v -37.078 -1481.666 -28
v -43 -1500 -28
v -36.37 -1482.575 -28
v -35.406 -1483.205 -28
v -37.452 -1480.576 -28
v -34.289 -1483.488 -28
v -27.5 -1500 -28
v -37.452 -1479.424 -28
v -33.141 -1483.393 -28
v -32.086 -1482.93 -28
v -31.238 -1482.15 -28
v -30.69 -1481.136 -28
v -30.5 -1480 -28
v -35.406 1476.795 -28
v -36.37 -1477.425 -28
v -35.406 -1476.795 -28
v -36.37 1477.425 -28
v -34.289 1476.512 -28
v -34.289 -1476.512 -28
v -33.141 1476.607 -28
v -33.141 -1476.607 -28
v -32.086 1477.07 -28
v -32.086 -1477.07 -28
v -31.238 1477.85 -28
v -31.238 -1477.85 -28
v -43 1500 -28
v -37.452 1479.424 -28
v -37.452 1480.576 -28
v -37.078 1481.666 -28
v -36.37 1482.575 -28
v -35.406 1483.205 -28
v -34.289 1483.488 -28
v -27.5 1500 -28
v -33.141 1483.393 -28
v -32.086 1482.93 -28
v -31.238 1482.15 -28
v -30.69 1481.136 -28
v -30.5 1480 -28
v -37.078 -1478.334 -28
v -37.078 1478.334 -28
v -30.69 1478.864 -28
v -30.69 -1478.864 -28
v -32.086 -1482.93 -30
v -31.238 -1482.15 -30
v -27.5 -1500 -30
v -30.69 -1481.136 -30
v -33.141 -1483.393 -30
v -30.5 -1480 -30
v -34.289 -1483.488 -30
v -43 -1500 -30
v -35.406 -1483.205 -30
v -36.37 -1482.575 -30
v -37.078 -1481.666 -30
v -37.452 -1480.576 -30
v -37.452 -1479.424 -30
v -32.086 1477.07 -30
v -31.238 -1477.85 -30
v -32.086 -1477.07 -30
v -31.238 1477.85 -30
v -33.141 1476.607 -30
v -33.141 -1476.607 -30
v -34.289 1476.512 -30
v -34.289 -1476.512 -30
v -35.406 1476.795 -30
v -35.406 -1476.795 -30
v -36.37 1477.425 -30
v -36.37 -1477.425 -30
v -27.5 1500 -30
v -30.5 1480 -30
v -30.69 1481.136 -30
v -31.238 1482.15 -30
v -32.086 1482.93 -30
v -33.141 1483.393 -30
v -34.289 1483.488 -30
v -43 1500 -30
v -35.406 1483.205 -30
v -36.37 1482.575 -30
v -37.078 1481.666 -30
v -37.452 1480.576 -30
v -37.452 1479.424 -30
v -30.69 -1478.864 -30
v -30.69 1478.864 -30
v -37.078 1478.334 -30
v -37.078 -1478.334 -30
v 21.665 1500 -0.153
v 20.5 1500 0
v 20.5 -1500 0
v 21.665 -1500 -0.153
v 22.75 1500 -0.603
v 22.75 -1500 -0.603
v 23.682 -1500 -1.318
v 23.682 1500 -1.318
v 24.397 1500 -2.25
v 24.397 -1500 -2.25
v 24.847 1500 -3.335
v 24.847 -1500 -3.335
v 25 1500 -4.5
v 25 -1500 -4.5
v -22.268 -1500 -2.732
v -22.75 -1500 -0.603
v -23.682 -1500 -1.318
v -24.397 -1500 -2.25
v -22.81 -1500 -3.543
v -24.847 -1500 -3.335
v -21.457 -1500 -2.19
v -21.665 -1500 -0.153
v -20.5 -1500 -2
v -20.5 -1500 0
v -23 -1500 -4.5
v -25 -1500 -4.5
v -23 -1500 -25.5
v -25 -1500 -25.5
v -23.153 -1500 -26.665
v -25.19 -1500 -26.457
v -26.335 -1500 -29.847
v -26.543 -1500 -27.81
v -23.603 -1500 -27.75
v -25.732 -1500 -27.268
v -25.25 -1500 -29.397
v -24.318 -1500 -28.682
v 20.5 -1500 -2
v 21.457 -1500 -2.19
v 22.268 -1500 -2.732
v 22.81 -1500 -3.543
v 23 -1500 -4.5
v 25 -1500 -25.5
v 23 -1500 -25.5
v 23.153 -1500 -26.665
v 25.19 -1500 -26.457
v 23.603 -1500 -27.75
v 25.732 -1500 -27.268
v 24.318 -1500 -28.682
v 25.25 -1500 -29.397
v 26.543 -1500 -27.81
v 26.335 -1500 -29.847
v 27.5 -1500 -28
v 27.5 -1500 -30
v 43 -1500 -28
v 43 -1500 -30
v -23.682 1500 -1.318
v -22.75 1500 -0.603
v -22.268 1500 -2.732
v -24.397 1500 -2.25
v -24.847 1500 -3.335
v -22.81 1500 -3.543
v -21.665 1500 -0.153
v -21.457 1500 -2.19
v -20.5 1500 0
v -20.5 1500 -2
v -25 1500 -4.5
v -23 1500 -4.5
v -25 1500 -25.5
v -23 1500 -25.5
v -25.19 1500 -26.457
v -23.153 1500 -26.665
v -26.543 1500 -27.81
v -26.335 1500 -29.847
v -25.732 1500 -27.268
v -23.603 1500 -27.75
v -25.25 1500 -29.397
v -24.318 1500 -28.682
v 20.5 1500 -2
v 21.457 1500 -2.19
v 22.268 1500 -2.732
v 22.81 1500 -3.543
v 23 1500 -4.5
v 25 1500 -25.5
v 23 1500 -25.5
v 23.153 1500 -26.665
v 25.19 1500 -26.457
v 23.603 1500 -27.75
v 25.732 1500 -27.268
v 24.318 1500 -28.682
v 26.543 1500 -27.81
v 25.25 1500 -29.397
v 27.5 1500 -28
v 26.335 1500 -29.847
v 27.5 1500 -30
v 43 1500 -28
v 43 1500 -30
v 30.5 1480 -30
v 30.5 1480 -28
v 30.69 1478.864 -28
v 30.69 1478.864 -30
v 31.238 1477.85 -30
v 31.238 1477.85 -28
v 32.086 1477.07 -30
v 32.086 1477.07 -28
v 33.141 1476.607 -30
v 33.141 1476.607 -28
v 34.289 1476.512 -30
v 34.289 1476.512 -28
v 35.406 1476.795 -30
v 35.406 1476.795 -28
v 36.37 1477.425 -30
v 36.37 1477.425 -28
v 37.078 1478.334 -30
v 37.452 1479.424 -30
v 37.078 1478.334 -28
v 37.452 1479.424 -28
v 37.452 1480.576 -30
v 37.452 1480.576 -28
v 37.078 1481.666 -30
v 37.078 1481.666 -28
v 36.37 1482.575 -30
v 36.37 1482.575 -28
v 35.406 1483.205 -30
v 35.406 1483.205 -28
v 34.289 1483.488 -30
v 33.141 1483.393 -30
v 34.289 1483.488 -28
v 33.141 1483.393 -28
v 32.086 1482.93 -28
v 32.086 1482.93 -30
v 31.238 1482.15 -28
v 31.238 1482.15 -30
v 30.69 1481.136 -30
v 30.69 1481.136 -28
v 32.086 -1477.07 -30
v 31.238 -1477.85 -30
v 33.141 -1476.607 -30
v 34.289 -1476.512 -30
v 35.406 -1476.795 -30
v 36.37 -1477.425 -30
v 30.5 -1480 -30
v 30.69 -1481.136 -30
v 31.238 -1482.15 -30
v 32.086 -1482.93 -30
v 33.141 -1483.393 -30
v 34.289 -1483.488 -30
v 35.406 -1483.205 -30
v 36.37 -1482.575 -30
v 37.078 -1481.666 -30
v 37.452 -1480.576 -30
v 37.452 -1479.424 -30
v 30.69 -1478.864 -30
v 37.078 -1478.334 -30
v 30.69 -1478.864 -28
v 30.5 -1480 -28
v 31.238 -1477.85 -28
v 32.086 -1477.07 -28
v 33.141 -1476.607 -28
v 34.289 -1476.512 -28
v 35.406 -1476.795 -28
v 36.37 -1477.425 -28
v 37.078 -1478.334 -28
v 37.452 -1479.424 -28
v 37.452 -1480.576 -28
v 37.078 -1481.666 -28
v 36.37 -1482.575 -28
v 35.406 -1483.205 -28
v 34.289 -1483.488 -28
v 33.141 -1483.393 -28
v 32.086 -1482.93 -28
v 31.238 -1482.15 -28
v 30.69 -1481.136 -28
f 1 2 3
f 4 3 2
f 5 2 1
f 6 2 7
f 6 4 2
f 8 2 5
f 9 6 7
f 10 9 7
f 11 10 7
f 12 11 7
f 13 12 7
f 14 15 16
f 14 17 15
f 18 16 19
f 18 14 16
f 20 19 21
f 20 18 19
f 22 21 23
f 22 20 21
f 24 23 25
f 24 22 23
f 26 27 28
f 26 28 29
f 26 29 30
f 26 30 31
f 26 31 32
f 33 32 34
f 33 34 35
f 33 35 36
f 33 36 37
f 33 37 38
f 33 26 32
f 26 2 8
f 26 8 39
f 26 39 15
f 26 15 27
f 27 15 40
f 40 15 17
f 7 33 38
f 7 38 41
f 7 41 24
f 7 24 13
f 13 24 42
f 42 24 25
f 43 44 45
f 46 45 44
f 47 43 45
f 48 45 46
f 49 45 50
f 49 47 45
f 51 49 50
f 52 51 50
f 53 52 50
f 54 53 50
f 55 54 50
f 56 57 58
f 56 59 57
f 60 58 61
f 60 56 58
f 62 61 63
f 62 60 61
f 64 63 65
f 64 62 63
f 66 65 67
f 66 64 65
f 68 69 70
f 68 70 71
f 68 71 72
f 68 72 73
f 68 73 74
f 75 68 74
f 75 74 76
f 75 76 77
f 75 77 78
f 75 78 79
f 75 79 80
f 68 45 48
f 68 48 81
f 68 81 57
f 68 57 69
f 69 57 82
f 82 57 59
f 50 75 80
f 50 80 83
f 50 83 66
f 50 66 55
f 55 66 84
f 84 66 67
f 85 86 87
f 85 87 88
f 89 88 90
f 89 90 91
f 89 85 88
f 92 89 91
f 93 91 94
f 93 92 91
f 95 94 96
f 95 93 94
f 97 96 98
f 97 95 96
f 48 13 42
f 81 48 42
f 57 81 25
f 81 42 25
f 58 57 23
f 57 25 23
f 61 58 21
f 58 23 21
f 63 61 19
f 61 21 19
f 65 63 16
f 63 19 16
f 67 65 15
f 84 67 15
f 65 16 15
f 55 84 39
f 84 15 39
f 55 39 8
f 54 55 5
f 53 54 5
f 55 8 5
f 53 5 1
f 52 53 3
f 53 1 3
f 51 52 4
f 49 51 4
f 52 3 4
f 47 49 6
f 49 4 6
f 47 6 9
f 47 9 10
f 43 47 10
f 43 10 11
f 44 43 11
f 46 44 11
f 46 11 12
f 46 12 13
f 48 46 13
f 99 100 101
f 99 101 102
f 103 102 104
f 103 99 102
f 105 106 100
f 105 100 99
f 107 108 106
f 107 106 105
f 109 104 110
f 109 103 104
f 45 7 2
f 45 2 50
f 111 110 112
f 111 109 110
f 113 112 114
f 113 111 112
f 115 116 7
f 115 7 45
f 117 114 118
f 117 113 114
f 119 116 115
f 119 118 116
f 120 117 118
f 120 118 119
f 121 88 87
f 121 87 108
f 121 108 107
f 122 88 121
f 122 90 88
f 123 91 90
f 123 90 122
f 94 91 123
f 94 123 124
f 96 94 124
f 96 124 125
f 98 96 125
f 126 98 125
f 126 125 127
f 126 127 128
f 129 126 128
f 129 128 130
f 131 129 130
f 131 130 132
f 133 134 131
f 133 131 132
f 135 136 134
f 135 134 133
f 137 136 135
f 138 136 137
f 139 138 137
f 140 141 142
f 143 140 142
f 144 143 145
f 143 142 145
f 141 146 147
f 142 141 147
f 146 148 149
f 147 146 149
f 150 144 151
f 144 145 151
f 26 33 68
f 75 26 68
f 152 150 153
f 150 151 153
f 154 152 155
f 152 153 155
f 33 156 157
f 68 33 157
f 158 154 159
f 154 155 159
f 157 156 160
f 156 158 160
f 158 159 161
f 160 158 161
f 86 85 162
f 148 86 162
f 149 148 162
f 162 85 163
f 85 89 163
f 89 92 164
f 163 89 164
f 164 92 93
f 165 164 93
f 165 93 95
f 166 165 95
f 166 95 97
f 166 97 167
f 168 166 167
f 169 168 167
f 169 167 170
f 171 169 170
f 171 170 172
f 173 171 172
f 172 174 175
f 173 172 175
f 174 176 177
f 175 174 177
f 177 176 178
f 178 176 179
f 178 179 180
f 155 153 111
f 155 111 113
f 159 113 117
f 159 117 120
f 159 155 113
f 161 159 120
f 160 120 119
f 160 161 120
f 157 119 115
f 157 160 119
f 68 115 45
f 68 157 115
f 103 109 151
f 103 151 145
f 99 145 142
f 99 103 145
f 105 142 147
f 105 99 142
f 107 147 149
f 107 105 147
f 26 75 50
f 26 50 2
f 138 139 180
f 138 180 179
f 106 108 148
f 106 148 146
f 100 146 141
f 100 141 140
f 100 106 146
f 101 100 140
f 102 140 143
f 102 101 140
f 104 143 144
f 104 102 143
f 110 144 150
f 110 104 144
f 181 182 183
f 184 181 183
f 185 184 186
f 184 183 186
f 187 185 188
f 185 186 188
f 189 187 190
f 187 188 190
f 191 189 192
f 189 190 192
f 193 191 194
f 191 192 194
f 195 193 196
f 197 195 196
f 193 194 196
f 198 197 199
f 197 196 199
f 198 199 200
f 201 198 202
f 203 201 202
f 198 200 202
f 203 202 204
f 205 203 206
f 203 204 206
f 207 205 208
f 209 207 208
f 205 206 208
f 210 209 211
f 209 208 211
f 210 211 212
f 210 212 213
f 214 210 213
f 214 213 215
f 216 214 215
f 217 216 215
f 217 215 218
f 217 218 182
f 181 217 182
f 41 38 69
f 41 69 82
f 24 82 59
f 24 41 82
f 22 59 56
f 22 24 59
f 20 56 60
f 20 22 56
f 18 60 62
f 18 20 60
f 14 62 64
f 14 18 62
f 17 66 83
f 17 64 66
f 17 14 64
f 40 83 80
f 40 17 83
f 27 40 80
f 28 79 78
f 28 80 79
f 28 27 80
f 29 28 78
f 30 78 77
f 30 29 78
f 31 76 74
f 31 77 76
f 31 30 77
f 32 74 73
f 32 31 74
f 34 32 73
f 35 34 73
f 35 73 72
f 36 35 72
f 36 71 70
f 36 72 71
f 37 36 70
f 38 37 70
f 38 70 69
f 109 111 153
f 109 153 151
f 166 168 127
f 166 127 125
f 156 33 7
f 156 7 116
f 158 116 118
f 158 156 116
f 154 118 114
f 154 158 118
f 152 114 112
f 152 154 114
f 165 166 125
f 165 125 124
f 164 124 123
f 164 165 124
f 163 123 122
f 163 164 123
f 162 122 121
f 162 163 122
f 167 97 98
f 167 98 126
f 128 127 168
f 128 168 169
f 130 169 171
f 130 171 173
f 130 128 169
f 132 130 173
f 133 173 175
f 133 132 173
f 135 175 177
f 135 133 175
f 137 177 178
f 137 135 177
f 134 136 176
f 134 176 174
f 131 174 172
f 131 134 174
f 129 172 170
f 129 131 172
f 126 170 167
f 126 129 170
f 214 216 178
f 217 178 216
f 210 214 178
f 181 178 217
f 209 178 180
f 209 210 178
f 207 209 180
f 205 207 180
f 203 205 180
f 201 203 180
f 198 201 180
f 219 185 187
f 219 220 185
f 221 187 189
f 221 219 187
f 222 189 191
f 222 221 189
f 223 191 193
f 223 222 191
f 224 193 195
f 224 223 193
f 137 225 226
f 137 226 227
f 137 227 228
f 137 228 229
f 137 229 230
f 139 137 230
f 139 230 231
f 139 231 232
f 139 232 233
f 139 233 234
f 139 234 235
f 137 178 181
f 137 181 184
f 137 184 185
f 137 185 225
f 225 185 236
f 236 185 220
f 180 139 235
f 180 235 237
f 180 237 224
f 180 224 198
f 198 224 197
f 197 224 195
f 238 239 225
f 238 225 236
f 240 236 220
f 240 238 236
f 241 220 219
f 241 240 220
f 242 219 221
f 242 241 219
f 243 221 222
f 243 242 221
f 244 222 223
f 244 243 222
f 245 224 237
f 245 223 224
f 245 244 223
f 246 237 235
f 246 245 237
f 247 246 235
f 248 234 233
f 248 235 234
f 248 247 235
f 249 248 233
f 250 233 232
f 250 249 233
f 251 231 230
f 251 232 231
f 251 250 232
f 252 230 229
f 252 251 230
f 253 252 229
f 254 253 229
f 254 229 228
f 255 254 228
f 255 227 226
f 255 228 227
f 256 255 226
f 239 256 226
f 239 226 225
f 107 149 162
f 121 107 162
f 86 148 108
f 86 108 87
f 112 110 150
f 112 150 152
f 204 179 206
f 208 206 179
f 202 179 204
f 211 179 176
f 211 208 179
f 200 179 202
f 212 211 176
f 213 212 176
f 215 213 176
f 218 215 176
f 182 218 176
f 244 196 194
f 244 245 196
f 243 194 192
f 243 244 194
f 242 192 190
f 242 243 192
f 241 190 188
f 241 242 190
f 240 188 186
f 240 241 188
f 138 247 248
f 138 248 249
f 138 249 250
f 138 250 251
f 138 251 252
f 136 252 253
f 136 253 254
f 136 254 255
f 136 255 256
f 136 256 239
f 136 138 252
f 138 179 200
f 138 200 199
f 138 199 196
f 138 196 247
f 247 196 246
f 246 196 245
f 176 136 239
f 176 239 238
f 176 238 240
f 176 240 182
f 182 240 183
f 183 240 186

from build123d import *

# Parameters (mm, degrees)
SKETCH1_W                      = 50
SKETCH1_H                      = 3000
BASE_FLANGE1_DEPTH             = 2
EDGE_FLANGE1_STRIP_W           = 13
EDGE_FLANGE1_STRIP_H           = 2
EDGE_FLANGE1_STRIP_CUT_DEPTH   = 3000
EDGE_FLANGE1_STRIP_2_W         = 13
EDGE_FLANGE1_STRIP_2_H         = 2
EDGE_FLANGE1_STRIP_CUT_2_DEPTH = 3000
EDGE_FLANGE1_DEPTH             = 3000
EDGE_FLANGE1_BEND_DEPTH        = 3000
EDGE_FLANGE2_STRIP_W           = 13
EDGE_FLANGE2_STRIP_H           = 2
EDGE_FLANGE2_STRIP_CUT_DEPTH   = 3000
EDGE_FLANGE2_STRIP_2_W         = 13
EDGE_FLANGE2_STRIP_2_H         = 2
EDGE_FLANGE2_STRIP_CUT_2_DEPTH = 3000
EDGE_FLANGE2_DEPTH             = 3000
EDGE_FLANGE2_BEND_DEPTH        = 3000
SKETCH18_R                     = 3.5
CUT_EXTRUDE1_DEPTH             = 10
MIRROR2_COPY_1_SKETCH_R        = 3.5
MIRROR2_COPY_1_DEPTH           = 10


# Sheet-metal steps are written as plain solids
with BuildPart() as part:
    # Sketch1 → Base-Flange1 (new body)
    with BuildSketch(Plane.XY):
        Rectangle(SKETCH1_W, SKETCH1_H)
    extrude(amount=-BASE_FLANGE1_DEPTH)

    # Edge-Flange1 strip (across the edge) → Edge-Flange1 strip cut (cut)
    with BuildSketch(Plane(origin=(25, 1500, -2), x_dir=(-1, 0, 0), z_dir=(0, -1, 0))):
        with Locations((-2, -1)):
            Rectangle(EDGE_FLANGE1_STRIP_W, EDGE_FLANGE1_STRIP_H)
    extrude(amount=EDGE_FLANGE1_STRIP_CUT_DEPTH, mode=Mode.SUBTRACT)

    # Edge-Flange1 strip 2 (across the edge) → Edge-Flange1 strip cut 2 (cut)
    with BuildSketch(Plane(origin=(-25, -1500, -2), x_dir=(1, 0, 0), z_dir=(0, 1, 0))):
        with Locations((-2, -1)):
            Rectangle(EDGE_FLANGE1_STRIP_2_W, EDGE_FLANGE1_STRIP_2_H)
    extrude(amount=EDGE_FLANGE1_STRIP_CUT_2_DEPTH, mode=Mode.SUBTRACT)

    # Edge-Flange1 section (across the edge) → Edge-Flange1 (add)
    with BuildSketch(Plane(origin=(25, 1500, -2), x_dir=(-1, 0, 0), z_dir=(0, -1, 0))):
        with BuildLine():
            Line((0, 2.5), (0, 28))
            Line((0, 28), (2, 28))
            Line((2, 28), (2, 2.5))
            ThreePointArc((2, 2.5), (2.732233047, 0.732233047), (4.5, 0))
            Line((4.5, 0), (4.5, -2))
            ThreePointArc((4.5, -2), (1.318019485, -0.681980515), (0, 2.5))
        make_face()
    extrude(amount=EDGE_FLANGE1_DEPTH)

    # Edge-Flange1 section 2 (across the edge) → Edge-Flange1 bend (add)
    with BuildSketch(Plane(origin=(-25, -1500, -2), x_dir=(1, 0, 0), z_dir=(0, 1, 0))):
        with BuildLine():
            Line((0, 2.5), (0, 28))
            Line((0, 28), (2, 28))
            Line((2, 28), (2, 2.5))
            ThreePointArc((2, 2.5), (2.732233047, 0.732233047), (4.5, 0))
            Line((4.5, 0), (4.5, -2))
            ThreePointArc((4.5, -2), (1.318019485, -0.681980515), (0, 2.5))
        make_face()
    extrude(amount=EDGE_FLANGE1_BEND_DEPTH)

    # Edge-Flange2 strip (across the edge) → Edge-Flange2 strip cut (cut)
    with BuildSketch(Plane(origin=(-25, 1500, -30), x_dir=(0, 0, 1), z_dir=(0, -1, 0))):
        with Locations((-2, -1)):
            Rectangle(EDGE_FLANGE2_STRIP_W, EDGE_FLANGE2_STRIP_H)
    extrude(amount=EDGE_FLANGE2_STRIP_CUT_DEPTH, mode=Mode.SUBTRACT)

    # Edge-Flange2 strip 2 (across the edge) → Edge-Flange2 strip cut 2 (cut)
    with BuildSketch(Plane(origin=(25, -1500, -30), x_dir=(0, 0, 1), z_dir=(0, 1, 0))):
        with Locations((-2, -1)):
            Rectangle(EDGE_FLANGE2_STRIP_2_W, EDGE_FLANGE2_STRIP_2_H)
    extrude(amount=EDGE_FLANGE2_STRIP_CUT_2_DEPTH, mode=Mode.SUBTRACT)

    # Edge-Flange2 section (across the edge) → Edge-Flange2 (add)
    with BuildSketch(Plane(origin=(-25, 1500, -30), x_dir=(0, 0, 1), z_dir=(0, -1, 0))):
        with BuildLine():
            Line((0, 2.5), (0, 18))
            Line((0, 18), (2, 18))
            Line((2, 18), (2, 2.5))
            ThreePointArc((2, 2.5), (2.732233047, 0.732233047), (4.5, 0))
            Line((4.5, 0), (4.5, -2))
            ThreePointArc((4.5, -2), (1.318019485, -0.681980515), (0, 2.5))
        make_face()
    extrude(amount=EDGE_FLANGE2_DEPTH)

    # Edge-Flange2 section 2 (across the edge) → Edge-Flange2 bend (add)
    with BuildSketch(Plane(origin=(25, -1500, -30), x_dir=(0, 0, 1), z_dir=(0, 1, 0))):
        with BuildLine():
            Line((0, 2.5), (0, 18))
            Line((0, 18), (2, 18))
            Line((2, 18), (2, 2.5))
            ThreePointArc((2, 2.5), (2.732233047, 0.732233047), (4.5, 0))
            Line((4.5, 0), (4.5, -2))
            ThreePointArc((4.5, -2), (1.318019485, -0.681980515), (0, 2.5))
        make_face()
    extrude(amount=EDGE_FLANGE2_BEND_DEPTH)

    # Sketch18 → Cut-Extrude1 (cut)
    with BuildSketch(Plane.XY.offset(-28)):
        with Locations((-34, -1480)):
            Circle(SKETCH18_R)
    cut_extrude1 = extrude(amount=-CUT_EXTRUDE1_DEPTH, mode=Mode.SUBTRACT)

    # Mirror1: Cut-Extrude1 across plane
    add(cut_extrude1.mirror(Plane.ZX), mode=Mode.SUBTRACT)

    # Mirror2: Cut-Extrude1 across plane
    add(cut_extrude1.mirror(Plane(origin=(0, 0, 0), x_dir=(0, 0, 1), z_dir=(1, 0, 0))), mode=Mode.SUBTRACT)

    # Mirror2 copy 1 sketch → Mirror2 copy 1 (cut)
    with BuildSketch(Plane(origin=(0, 0, -28), x_dir=(-1, 0, 0), z_dir=(0, 0, 1))):
        with Locations((-34, -1480)):
            Circle(MIRROR2_COPY_1_SKETCH_R)
    extrude(amount=-MIRROR2_COPY_1_DEPTH, mode=Mode.SUBTRACT)


solid = part.part
